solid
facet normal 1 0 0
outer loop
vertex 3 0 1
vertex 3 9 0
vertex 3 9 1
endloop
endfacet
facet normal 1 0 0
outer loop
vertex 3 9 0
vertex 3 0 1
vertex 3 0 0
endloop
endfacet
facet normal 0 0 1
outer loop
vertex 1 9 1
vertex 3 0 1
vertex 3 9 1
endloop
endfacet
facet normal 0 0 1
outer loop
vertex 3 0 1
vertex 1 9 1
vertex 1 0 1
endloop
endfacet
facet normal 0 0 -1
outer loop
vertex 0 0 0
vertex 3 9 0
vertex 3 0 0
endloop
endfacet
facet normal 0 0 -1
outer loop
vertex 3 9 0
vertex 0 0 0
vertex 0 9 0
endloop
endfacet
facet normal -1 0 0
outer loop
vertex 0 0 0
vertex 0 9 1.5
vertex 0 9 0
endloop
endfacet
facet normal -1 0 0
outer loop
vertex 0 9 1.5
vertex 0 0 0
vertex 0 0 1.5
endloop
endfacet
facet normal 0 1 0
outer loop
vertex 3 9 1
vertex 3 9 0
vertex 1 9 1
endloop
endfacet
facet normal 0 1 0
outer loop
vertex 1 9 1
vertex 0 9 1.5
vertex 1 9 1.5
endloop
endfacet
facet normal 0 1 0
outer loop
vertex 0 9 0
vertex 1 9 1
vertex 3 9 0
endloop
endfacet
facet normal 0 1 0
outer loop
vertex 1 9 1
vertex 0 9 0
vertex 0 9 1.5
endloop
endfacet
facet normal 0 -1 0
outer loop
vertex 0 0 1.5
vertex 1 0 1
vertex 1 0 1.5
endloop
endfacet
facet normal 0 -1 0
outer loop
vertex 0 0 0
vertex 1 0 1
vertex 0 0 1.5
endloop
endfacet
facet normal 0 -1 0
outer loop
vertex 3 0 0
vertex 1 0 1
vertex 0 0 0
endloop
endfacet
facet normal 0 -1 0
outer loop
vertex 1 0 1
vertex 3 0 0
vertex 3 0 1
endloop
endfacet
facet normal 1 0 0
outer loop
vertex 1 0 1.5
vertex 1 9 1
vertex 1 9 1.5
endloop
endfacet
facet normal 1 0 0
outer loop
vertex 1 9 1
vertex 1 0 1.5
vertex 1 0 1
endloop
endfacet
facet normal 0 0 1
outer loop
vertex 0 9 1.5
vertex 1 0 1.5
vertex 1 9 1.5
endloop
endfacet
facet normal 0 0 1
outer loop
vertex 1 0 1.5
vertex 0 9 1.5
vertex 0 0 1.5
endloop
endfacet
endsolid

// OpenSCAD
module lip() {
    cube([3,9,1]);
    translate([0,0,1]){
        cube([1,9,0.5]);
    }
}
lip();
